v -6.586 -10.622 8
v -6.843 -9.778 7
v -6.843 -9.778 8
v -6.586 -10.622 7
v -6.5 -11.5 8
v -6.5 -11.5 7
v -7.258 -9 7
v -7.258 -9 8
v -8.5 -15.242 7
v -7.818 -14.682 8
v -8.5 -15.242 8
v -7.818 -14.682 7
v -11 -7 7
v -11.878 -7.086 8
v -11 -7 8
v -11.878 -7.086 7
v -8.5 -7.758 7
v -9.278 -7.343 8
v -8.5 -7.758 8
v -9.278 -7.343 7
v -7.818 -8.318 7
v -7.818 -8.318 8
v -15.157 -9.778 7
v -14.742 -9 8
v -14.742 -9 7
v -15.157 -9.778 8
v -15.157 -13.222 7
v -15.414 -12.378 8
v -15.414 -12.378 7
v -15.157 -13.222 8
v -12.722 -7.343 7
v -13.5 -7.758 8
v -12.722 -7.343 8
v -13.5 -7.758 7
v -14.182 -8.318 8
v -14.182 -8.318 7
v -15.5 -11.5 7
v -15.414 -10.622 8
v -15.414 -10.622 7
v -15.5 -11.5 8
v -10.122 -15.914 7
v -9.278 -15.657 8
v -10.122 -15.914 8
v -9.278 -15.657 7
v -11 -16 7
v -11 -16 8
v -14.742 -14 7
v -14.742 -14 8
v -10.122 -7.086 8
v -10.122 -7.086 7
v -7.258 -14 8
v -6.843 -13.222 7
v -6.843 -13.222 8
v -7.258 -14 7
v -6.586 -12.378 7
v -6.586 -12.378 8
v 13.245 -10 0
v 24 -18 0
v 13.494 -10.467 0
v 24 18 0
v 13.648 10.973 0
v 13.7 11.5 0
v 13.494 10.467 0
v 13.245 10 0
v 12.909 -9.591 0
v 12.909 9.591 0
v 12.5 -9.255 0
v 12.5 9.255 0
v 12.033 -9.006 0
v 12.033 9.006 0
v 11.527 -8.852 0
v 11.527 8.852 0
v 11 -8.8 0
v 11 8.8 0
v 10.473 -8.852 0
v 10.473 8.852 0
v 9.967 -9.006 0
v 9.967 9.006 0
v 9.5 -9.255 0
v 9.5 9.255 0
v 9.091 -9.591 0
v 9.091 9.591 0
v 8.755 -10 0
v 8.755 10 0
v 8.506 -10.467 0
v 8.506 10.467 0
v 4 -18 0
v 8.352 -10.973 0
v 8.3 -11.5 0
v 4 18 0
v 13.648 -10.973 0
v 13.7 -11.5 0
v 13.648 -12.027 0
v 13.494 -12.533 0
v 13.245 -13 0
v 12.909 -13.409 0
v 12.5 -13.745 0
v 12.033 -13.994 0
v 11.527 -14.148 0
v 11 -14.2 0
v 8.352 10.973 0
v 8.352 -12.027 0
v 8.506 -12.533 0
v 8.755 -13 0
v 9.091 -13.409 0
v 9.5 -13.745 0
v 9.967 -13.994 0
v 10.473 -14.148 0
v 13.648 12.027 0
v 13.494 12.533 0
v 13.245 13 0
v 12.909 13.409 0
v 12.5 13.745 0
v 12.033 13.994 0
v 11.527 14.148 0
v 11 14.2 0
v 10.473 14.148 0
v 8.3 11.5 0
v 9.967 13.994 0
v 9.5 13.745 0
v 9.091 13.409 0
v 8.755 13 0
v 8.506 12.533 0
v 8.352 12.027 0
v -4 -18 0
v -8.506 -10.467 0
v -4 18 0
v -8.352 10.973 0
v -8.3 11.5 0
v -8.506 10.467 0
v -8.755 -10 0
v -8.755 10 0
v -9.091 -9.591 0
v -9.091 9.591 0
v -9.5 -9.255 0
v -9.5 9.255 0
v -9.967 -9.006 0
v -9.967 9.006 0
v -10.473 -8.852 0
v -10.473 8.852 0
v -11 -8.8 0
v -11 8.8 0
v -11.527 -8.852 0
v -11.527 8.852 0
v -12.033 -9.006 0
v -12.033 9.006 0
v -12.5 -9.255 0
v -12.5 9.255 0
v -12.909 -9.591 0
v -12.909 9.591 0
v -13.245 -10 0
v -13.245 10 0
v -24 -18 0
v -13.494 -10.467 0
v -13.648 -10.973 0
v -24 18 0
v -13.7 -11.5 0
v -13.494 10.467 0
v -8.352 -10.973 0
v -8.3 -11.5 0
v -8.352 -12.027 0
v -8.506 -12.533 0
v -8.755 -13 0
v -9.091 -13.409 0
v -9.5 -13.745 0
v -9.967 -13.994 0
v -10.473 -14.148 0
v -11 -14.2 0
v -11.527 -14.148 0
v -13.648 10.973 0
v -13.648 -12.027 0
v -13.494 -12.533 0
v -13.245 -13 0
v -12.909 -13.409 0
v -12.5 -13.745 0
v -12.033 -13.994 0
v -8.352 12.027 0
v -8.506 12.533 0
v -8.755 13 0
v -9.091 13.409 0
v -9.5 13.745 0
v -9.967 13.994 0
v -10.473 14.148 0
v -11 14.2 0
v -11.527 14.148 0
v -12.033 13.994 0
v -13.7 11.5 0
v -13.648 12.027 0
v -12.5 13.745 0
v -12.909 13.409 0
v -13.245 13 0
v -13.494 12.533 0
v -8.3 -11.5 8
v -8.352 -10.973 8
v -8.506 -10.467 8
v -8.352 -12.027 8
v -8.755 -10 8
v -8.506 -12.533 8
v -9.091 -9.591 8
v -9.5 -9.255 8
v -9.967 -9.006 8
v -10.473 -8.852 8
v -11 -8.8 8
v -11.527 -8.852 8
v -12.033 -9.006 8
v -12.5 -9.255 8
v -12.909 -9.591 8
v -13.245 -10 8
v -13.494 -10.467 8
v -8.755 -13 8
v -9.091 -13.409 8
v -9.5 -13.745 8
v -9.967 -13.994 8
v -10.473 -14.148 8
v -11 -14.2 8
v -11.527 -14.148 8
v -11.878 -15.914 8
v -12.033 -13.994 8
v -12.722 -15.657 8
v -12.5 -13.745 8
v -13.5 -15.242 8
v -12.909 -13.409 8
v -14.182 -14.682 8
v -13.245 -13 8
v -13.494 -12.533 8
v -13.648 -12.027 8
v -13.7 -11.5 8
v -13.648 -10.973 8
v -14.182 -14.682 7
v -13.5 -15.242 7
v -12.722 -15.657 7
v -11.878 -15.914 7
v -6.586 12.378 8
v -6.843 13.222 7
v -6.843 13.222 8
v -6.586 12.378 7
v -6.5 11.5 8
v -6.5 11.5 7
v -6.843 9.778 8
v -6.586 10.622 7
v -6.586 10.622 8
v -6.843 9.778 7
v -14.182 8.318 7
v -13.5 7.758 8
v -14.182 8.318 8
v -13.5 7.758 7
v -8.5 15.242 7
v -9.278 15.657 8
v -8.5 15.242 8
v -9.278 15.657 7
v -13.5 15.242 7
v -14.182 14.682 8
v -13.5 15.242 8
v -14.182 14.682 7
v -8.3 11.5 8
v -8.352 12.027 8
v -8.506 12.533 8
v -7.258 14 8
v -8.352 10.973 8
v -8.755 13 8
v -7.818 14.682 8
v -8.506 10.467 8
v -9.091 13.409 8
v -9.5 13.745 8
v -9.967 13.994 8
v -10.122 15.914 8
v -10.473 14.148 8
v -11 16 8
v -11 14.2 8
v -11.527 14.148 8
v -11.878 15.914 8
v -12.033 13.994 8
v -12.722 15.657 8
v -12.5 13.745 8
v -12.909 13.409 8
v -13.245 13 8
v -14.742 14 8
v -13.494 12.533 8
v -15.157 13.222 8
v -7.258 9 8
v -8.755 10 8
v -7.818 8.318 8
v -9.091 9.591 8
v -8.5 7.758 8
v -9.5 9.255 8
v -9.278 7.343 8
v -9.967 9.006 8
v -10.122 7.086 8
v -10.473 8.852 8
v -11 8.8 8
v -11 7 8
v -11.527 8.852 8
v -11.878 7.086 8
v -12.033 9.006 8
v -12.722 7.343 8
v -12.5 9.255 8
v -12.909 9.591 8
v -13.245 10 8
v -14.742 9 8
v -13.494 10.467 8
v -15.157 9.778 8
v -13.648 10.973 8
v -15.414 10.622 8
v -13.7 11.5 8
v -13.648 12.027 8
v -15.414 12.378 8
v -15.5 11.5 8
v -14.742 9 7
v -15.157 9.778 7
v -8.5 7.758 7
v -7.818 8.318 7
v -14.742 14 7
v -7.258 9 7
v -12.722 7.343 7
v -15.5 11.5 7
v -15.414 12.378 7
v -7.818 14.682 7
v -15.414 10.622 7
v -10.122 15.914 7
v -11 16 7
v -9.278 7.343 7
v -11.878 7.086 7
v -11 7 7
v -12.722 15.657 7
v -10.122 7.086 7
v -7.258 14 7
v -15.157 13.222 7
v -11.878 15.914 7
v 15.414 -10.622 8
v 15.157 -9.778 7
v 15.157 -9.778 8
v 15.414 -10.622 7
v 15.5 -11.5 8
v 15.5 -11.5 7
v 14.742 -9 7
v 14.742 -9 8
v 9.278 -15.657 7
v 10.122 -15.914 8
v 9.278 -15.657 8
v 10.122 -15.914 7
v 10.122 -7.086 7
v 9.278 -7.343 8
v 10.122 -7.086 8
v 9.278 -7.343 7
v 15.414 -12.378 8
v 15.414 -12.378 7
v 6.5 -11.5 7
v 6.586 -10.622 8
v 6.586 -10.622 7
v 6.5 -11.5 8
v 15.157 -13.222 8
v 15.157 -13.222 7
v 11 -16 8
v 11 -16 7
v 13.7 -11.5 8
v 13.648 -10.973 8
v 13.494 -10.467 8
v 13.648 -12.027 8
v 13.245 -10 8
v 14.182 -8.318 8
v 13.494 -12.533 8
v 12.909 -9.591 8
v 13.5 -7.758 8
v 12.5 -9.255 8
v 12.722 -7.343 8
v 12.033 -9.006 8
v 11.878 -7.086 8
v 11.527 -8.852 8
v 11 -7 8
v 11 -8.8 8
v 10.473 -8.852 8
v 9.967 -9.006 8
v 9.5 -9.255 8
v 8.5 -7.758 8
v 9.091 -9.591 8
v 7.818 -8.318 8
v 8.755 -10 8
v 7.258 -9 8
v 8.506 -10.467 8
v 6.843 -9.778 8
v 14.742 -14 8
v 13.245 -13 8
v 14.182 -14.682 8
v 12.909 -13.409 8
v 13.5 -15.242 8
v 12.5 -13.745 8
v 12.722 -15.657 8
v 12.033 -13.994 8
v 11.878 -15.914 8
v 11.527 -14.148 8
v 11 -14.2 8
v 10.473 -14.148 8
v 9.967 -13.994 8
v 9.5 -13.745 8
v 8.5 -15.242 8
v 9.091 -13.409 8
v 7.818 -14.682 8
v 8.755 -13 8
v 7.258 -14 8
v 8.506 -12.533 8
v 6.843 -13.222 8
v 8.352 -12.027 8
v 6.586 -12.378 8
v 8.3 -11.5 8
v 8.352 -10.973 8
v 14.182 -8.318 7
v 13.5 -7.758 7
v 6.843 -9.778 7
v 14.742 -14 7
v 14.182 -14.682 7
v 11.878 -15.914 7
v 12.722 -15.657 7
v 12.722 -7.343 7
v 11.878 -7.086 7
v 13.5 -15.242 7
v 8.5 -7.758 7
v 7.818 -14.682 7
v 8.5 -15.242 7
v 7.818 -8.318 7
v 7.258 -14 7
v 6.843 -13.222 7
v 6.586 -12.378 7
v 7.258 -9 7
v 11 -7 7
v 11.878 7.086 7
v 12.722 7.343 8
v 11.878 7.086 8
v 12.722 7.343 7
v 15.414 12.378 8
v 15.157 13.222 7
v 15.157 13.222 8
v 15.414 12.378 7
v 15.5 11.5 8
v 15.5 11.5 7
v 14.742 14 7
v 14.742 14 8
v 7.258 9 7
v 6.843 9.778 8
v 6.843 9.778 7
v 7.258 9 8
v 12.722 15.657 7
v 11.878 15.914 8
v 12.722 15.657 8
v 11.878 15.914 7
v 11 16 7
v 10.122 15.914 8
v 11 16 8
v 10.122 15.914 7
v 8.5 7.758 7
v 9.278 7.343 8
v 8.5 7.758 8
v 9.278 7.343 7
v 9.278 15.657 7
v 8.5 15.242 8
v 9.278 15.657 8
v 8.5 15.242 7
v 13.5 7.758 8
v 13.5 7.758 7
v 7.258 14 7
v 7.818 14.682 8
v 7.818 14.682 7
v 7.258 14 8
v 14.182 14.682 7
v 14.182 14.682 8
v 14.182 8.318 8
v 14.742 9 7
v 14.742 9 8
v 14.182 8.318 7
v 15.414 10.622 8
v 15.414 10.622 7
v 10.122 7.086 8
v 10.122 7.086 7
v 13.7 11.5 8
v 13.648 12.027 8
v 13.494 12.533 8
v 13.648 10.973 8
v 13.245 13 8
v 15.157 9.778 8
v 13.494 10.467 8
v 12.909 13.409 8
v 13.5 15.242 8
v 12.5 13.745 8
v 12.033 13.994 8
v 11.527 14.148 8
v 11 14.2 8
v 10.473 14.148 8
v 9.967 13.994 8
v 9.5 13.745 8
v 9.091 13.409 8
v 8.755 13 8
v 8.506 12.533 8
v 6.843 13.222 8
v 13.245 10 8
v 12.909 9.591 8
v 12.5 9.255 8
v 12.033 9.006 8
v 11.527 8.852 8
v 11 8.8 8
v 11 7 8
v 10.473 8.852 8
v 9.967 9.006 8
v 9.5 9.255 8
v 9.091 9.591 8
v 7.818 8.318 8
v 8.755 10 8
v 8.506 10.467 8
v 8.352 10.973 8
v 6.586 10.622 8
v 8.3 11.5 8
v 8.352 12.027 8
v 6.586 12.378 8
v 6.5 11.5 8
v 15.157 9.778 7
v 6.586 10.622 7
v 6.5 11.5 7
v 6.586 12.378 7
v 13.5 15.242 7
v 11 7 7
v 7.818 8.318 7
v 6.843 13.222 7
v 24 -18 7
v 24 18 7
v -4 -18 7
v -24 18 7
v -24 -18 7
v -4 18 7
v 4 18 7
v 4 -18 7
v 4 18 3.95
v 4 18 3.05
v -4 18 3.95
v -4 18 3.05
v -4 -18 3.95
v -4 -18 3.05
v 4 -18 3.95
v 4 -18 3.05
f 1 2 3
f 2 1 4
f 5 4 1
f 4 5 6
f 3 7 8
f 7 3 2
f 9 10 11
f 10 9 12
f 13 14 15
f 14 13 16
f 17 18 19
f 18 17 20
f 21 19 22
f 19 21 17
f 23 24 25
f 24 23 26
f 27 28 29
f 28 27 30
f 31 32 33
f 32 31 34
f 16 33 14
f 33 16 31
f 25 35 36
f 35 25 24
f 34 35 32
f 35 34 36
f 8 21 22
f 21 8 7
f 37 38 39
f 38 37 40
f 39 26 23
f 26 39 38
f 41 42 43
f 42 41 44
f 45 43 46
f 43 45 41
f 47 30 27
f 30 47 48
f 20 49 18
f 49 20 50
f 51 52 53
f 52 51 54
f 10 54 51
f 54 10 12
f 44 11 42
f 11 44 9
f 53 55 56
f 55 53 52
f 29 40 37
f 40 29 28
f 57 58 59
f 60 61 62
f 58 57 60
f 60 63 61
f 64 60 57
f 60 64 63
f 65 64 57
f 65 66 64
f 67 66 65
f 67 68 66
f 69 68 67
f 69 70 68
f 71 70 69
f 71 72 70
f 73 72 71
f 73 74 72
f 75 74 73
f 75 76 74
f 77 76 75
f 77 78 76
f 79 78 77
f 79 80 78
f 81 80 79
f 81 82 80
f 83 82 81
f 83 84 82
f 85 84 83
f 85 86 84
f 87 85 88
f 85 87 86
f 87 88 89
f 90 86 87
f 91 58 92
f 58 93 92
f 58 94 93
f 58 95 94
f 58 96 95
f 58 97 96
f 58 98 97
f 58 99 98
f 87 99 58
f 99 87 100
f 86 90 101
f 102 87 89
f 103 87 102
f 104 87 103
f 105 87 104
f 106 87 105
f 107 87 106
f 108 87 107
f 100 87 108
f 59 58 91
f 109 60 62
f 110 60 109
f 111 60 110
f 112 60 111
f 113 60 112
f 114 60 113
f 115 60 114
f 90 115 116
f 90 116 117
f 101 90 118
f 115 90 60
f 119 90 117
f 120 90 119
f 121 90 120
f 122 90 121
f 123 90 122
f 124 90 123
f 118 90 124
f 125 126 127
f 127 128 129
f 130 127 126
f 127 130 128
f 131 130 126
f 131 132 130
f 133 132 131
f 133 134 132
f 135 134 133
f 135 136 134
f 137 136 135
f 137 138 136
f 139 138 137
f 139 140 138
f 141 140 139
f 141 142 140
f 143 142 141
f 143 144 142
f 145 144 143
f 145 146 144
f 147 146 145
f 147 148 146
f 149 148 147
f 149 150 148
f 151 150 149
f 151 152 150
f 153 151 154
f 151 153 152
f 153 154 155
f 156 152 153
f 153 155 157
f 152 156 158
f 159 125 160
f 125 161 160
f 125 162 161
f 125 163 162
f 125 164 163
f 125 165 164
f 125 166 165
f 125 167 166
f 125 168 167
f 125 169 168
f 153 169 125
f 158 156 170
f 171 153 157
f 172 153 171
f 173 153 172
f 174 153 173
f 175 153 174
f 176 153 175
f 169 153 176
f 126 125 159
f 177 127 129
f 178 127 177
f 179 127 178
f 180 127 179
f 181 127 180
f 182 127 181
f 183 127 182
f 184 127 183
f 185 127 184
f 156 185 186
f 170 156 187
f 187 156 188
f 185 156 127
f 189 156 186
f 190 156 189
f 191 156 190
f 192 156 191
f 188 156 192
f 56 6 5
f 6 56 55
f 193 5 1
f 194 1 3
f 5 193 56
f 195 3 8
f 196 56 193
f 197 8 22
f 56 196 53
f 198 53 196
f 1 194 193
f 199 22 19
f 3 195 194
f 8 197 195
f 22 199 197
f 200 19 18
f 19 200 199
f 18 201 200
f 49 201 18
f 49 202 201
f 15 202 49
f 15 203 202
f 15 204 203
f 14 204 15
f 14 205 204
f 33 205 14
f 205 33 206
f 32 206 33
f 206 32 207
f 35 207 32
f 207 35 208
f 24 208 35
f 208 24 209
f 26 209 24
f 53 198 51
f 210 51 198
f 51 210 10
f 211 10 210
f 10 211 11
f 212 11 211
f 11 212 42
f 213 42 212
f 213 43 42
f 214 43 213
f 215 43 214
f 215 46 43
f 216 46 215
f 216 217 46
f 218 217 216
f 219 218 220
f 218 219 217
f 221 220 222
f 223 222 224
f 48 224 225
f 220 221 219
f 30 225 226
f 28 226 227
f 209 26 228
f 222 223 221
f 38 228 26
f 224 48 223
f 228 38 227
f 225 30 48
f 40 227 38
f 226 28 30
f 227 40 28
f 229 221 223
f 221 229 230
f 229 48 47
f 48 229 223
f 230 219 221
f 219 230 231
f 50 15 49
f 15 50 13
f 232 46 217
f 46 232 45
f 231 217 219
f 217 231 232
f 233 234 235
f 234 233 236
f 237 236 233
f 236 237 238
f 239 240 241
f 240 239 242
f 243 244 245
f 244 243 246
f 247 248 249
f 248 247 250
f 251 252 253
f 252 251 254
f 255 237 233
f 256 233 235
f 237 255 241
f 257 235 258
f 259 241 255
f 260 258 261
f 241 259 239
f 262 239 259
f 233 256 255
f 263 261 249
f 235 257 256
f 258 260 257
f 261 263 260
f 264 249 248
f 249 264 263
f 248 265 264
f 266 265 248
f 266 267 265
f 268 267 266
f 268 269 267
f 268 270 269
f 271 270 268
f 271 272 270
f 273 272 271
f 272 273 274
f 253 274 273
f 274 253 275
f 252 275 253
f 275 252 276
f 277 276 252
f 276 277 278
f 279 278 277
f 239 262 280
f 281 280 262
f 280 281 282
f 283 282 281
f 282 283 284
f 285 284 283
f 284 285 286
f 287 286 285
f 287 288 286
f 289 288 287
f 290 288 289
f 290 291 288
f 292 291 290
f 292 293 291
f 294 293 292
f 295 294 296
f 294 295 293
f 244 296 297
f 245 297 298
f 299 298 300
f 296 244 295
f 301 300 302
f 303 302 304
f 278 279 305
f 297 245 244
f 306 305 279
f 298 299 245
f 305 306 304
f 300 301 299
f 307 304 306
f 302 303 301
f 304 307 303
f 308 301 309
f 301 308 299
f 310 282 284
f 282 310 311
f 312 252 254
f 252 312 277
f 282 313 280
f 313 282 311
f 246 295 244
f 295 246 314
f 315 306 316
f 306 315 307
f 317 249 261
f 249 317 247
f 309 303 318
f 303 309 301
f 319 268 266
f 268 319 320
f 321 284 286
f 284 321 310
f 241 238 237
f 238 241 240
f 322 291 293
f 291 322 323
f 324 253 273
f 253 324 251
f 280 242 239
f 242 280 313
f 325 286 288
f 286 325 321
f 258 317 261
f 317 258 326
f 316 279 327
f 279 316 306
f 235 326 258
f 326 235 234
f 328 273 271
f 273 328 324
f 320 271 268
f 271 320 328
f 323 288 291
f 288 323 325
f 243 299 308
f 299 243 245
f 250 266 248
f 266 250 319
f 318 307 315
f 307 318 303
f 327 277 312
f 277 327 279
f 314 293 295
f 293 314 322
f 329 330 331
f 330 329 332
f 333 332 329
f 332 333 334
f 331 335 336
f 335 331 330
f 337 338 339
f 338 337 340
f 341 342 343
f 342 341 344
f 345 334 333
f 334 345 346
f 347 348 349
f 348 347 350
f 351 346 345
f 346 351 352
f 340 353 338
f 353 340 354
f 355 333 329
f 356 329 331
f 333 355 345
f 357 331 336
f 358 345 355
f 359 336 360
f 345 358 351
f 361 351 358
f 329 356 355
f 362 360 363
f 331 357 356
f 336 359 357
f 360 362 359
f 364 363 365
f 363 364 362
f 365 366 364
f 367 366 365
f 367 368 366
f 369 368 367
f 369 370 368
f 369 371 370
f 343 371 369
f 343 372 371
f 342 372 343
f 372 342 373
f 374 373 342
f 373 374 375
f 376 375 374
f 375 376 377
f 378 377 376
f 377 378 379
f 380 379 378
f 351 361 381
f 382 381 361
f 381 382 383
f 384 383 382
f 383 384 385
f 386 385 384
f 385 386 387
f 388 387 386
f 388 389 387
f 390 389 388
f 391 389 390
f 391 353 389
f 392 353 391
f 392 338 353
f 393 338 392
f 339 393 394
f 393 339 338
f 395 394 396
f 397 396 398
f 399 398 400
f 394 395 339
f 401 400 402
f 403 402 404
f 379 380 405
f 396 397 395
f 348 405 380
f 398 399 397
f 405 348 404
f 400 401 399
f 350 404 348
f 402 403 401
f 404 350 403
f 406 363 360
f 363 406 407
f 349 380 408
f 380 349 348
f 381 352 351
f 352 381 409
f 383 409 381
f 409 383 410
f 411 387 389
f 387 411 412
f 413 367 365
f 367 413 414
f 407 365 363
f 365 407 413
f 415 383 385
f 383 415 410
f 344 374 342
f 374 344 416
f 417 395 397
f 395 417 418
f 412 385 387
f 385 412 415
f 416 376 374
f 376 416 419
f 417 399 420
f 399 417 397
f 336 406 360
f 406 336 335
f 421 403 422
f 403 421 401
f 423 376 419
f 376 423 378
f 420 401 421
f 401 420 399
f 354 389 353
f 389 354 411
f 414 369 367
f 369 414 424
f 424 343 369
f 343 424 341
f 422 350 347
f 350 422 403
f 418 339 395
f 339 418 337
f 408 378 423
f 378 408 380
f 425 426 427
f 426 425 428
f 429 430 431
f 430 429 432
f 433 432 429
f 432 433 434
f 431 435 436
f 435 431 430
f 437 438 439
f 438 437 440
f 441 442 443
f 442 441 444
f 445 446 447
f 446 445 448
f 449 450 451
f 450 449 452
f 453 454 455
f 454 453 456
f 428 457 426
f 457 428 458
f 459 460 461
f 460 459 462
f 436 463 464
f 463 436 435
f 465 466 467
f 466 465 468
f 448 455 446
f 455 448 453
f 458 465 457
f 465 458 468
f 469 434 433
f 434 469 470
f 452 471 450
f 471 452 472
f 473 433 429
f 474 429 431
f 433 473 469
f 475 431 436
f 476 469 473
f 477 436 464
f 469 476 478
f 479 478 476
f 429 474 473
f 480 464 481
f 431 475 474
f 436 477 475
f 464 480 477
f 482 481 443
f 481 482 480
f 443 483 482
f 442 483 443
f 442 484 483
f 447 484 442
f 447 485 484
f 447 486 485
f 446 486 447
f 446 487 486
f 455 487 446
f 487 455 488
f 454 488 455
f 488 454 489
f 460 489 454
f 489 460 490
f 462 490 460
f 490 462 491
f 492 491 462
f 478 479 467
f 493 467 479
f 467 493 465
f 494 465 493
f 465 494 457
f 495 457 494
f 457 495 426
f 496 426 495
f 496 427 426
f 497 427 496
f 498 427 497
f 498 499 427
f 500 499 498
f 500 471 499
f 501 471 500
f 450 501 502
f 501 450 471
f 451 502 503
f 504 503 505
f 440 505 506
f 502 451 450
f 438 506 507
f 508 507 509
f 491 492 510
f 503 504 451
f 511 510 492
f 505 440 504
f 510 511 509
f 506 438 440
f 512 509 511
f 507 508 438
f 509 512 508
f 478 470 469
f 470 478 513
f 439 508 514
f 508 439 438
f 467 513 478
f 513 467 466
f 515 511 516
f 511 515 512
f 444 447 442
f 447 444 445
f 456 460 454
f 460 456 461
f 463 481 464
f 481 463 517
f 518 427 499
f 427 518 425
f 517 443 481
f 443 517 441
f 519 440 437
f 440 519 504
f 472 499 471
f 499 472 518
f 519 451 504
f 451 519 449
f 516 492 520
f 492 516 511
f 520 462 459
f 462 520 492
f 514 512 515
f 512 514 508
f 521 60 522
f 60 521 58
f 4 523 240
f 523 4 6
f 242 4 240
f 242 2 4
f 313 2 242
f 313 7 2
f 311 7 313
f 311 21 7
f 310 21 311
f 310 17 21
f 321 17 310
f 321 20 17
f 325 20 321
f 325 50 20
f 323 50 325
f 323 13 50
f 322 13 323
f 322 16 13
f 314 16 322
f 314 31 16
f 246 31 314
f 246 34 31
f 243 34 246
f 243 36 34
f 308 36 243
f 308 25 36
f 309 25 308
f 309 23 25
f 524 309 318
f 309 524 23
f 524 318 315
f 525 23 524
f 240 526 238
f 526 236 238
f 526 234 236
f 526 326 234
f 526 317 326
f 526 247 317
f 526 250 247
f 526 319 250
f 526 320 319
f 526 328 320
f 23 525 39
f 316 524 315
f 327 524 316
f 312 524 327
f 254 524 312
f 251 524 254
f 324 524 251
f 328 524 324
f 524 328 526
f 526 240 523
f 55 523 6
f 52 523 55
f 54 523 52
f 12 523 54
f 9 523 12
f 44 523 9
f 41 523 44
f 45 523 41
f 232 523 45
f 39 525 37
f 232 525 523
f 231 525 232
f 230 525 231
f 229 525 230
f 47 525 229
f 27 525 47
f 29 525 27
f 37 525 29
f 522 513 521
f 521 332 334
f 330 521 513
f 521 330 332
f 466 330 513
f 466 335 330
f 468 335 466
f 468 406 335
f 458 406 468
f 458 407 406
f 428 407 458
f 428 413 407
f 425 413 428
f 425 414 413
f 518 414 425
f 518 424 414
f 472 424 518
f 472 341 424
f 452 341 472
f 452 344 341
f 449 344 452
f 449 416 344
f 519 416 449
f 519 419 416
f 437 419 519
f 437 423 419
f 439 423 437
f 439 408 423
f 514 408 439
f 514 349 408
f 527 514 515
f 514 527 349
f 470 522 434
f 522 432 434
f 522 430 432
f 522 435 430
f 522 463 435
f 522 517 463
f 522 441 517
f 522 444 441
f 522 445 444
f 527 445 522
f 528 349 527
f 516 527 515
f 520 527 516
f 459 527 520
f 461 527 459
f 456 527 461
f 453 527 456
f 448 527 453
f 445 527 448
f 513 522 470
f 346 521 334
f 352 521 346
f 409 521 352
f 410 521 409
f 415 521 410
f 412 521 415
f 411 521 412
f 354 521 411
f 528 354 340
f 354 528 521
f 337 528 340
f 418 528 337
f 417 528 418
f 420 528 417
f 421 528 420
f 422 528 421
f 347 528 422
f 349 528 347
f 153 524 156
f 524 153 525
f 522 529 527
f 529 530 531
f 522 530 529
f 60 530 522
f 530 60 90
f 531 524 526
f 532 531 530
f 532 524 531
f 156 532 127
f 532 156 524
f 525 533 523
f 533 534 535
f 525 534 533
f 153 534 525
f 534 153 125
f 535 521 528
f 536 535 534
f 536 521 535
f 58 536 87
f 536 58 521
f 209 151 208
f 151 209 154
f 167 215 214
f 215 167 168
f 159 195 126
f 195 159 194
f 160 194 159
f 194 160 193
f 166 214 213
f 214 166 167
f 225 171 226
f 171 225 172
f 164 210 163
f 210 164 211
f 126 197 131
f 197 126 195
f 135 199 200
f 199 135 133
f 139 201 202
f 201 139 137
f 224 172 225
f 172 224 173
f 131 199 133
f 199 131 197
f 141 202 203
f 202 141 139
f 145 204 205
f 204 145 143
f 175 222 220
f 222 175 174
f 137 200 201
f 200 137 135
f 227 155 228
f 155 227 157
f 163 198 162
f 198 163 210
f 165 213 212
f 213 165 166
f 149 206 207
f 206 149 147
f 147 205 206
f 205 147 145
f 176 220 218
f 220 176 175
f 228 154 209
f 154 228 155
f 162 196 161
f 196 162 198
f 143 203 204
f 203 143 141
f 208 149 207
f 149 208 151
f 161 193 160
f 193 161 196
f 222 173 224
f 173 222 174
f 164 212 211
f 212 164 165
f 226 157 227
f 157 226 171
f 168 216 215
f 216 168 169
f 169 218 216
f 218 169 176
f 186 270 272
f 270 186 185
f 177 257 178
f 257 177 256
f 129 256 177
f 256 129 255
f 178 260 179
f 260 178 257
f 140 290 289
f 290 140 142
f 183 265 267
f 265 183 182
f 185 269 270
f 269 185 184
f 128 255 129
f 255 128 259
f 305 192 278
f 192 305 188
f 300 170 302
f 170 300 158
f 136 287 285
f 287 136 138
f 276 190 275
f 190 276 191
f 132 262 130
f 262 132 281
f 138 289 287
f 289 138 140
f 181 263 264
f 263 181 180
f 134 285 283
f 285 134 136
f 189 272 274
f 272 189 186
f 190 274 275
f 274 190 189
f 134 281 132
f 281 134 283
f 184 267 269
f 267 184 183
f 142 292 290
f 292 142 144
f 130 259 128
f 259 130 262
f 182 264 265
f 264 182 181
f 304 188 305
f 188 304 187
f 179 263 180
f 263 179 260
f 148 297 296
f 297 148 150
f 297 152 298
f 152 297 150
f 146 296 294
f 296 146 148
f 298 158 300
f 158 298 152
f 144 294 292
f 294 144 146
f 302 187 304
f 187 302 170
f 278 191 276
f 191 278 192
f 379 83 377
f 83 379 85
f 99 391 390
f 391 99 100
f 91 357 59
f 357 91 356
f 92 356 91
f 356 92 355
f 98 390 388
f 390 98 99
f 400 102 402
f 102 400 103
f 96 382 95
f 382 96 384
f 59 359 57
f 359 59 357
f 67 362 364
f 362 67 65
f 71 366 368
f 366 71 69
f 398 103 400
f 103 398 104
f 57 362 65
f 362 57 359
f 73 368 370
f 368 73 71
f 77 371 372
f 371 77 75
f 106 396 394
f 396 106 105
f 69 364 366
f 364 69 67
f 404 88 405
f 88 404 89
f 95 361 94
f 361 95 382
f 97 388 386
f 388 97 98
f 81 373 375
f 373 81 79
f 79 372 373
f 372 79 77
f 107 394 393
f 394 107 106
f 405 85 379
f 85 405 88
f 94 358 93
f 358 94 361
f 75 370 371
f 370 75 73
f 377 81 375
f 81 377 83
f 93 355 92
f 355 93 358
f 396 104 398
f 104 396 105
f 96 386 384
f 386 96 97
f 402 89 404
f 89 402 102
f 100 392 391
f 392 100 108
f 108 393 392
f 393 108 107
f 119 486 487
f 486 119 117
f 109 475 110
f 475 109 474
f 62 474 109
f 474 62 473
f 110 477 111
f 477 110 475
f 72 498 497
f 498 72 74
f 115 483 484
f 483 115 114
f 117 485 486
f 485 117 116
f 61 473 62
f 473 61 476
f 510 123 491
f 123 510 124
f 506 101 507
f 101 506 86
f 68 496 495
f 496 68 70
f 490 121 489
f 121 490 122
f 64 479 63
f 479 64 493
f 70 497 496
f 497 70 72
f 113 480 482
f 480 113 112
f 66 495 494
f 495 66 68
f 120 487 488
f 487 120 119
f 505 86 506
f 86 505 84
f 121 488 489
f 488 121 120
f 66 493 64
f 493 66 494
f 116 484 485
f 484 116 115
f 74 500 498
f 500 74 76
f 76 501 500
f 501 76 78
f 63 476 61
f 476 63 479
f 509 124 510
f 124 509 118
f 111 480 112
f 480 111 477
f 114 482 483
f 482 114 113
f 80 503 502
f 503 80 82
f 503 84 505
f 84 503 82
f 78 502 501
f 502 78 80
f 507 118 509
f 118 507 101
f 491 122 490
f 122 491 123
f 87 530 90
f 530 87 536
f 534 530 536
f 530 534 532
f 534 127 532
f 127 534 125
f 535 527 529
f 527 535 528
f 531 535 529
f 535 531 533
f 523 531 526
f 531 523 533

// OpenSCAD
$fn = 32;

// ----------------------------------------------------------------------
// Living hinge: 48 x 36 mm plates, 0.9 mm flexible web
// ----------------------------------------------------------------------

// --- parameters (mm) ---
plate_len = 20;           // plate length outside the web
plate_w = 36;             // plate width
thick = 7;                // plate thickness
web_half = 4;             // half width of the flex band
web_t = 0.9;              // flexible web thickness
web_z = 3.05;             // web position inside the thickness
boss_d = 9;               // screw boss diameter
boss_h = 8;               // screw boss height
boss_x = 11;              // screw boss distance from the web
screw_d = 5.4;            // screw hole

difference() {
  union() {
    /* one flat strip, later thinned at the middle */
    translate([-24, -18, 0]) cube([48, 36, 7]);
    /* screw bosses, sunk 0.5 mm into the plates */
    for (sx = [-11, 11]) {
      for (sy = [-11.5, 11.5]) {
        translate([sx, sy, 0]) cylinder(h = boss_h, d = boss_d);
      }
    }
  }
  /* channel from below: leaves the web on top of it */
  translate([-4, -20.5, -2.5]) cube([8, 41, 5.55]);
  /* channel from above: thins the web down to web_t */
  translate([-4, -20.5, 3.95]) cube([8, 41, 5.55]);
  /* screw holes through the bosses */
  for (sx = [-11, 11]) {
    for (sy = [-11.5, 11.5]) {
      translate([sx, sy, -2.5]) cylinder(h = boss_h + 5, d = screw_d);
    }
  }
}
